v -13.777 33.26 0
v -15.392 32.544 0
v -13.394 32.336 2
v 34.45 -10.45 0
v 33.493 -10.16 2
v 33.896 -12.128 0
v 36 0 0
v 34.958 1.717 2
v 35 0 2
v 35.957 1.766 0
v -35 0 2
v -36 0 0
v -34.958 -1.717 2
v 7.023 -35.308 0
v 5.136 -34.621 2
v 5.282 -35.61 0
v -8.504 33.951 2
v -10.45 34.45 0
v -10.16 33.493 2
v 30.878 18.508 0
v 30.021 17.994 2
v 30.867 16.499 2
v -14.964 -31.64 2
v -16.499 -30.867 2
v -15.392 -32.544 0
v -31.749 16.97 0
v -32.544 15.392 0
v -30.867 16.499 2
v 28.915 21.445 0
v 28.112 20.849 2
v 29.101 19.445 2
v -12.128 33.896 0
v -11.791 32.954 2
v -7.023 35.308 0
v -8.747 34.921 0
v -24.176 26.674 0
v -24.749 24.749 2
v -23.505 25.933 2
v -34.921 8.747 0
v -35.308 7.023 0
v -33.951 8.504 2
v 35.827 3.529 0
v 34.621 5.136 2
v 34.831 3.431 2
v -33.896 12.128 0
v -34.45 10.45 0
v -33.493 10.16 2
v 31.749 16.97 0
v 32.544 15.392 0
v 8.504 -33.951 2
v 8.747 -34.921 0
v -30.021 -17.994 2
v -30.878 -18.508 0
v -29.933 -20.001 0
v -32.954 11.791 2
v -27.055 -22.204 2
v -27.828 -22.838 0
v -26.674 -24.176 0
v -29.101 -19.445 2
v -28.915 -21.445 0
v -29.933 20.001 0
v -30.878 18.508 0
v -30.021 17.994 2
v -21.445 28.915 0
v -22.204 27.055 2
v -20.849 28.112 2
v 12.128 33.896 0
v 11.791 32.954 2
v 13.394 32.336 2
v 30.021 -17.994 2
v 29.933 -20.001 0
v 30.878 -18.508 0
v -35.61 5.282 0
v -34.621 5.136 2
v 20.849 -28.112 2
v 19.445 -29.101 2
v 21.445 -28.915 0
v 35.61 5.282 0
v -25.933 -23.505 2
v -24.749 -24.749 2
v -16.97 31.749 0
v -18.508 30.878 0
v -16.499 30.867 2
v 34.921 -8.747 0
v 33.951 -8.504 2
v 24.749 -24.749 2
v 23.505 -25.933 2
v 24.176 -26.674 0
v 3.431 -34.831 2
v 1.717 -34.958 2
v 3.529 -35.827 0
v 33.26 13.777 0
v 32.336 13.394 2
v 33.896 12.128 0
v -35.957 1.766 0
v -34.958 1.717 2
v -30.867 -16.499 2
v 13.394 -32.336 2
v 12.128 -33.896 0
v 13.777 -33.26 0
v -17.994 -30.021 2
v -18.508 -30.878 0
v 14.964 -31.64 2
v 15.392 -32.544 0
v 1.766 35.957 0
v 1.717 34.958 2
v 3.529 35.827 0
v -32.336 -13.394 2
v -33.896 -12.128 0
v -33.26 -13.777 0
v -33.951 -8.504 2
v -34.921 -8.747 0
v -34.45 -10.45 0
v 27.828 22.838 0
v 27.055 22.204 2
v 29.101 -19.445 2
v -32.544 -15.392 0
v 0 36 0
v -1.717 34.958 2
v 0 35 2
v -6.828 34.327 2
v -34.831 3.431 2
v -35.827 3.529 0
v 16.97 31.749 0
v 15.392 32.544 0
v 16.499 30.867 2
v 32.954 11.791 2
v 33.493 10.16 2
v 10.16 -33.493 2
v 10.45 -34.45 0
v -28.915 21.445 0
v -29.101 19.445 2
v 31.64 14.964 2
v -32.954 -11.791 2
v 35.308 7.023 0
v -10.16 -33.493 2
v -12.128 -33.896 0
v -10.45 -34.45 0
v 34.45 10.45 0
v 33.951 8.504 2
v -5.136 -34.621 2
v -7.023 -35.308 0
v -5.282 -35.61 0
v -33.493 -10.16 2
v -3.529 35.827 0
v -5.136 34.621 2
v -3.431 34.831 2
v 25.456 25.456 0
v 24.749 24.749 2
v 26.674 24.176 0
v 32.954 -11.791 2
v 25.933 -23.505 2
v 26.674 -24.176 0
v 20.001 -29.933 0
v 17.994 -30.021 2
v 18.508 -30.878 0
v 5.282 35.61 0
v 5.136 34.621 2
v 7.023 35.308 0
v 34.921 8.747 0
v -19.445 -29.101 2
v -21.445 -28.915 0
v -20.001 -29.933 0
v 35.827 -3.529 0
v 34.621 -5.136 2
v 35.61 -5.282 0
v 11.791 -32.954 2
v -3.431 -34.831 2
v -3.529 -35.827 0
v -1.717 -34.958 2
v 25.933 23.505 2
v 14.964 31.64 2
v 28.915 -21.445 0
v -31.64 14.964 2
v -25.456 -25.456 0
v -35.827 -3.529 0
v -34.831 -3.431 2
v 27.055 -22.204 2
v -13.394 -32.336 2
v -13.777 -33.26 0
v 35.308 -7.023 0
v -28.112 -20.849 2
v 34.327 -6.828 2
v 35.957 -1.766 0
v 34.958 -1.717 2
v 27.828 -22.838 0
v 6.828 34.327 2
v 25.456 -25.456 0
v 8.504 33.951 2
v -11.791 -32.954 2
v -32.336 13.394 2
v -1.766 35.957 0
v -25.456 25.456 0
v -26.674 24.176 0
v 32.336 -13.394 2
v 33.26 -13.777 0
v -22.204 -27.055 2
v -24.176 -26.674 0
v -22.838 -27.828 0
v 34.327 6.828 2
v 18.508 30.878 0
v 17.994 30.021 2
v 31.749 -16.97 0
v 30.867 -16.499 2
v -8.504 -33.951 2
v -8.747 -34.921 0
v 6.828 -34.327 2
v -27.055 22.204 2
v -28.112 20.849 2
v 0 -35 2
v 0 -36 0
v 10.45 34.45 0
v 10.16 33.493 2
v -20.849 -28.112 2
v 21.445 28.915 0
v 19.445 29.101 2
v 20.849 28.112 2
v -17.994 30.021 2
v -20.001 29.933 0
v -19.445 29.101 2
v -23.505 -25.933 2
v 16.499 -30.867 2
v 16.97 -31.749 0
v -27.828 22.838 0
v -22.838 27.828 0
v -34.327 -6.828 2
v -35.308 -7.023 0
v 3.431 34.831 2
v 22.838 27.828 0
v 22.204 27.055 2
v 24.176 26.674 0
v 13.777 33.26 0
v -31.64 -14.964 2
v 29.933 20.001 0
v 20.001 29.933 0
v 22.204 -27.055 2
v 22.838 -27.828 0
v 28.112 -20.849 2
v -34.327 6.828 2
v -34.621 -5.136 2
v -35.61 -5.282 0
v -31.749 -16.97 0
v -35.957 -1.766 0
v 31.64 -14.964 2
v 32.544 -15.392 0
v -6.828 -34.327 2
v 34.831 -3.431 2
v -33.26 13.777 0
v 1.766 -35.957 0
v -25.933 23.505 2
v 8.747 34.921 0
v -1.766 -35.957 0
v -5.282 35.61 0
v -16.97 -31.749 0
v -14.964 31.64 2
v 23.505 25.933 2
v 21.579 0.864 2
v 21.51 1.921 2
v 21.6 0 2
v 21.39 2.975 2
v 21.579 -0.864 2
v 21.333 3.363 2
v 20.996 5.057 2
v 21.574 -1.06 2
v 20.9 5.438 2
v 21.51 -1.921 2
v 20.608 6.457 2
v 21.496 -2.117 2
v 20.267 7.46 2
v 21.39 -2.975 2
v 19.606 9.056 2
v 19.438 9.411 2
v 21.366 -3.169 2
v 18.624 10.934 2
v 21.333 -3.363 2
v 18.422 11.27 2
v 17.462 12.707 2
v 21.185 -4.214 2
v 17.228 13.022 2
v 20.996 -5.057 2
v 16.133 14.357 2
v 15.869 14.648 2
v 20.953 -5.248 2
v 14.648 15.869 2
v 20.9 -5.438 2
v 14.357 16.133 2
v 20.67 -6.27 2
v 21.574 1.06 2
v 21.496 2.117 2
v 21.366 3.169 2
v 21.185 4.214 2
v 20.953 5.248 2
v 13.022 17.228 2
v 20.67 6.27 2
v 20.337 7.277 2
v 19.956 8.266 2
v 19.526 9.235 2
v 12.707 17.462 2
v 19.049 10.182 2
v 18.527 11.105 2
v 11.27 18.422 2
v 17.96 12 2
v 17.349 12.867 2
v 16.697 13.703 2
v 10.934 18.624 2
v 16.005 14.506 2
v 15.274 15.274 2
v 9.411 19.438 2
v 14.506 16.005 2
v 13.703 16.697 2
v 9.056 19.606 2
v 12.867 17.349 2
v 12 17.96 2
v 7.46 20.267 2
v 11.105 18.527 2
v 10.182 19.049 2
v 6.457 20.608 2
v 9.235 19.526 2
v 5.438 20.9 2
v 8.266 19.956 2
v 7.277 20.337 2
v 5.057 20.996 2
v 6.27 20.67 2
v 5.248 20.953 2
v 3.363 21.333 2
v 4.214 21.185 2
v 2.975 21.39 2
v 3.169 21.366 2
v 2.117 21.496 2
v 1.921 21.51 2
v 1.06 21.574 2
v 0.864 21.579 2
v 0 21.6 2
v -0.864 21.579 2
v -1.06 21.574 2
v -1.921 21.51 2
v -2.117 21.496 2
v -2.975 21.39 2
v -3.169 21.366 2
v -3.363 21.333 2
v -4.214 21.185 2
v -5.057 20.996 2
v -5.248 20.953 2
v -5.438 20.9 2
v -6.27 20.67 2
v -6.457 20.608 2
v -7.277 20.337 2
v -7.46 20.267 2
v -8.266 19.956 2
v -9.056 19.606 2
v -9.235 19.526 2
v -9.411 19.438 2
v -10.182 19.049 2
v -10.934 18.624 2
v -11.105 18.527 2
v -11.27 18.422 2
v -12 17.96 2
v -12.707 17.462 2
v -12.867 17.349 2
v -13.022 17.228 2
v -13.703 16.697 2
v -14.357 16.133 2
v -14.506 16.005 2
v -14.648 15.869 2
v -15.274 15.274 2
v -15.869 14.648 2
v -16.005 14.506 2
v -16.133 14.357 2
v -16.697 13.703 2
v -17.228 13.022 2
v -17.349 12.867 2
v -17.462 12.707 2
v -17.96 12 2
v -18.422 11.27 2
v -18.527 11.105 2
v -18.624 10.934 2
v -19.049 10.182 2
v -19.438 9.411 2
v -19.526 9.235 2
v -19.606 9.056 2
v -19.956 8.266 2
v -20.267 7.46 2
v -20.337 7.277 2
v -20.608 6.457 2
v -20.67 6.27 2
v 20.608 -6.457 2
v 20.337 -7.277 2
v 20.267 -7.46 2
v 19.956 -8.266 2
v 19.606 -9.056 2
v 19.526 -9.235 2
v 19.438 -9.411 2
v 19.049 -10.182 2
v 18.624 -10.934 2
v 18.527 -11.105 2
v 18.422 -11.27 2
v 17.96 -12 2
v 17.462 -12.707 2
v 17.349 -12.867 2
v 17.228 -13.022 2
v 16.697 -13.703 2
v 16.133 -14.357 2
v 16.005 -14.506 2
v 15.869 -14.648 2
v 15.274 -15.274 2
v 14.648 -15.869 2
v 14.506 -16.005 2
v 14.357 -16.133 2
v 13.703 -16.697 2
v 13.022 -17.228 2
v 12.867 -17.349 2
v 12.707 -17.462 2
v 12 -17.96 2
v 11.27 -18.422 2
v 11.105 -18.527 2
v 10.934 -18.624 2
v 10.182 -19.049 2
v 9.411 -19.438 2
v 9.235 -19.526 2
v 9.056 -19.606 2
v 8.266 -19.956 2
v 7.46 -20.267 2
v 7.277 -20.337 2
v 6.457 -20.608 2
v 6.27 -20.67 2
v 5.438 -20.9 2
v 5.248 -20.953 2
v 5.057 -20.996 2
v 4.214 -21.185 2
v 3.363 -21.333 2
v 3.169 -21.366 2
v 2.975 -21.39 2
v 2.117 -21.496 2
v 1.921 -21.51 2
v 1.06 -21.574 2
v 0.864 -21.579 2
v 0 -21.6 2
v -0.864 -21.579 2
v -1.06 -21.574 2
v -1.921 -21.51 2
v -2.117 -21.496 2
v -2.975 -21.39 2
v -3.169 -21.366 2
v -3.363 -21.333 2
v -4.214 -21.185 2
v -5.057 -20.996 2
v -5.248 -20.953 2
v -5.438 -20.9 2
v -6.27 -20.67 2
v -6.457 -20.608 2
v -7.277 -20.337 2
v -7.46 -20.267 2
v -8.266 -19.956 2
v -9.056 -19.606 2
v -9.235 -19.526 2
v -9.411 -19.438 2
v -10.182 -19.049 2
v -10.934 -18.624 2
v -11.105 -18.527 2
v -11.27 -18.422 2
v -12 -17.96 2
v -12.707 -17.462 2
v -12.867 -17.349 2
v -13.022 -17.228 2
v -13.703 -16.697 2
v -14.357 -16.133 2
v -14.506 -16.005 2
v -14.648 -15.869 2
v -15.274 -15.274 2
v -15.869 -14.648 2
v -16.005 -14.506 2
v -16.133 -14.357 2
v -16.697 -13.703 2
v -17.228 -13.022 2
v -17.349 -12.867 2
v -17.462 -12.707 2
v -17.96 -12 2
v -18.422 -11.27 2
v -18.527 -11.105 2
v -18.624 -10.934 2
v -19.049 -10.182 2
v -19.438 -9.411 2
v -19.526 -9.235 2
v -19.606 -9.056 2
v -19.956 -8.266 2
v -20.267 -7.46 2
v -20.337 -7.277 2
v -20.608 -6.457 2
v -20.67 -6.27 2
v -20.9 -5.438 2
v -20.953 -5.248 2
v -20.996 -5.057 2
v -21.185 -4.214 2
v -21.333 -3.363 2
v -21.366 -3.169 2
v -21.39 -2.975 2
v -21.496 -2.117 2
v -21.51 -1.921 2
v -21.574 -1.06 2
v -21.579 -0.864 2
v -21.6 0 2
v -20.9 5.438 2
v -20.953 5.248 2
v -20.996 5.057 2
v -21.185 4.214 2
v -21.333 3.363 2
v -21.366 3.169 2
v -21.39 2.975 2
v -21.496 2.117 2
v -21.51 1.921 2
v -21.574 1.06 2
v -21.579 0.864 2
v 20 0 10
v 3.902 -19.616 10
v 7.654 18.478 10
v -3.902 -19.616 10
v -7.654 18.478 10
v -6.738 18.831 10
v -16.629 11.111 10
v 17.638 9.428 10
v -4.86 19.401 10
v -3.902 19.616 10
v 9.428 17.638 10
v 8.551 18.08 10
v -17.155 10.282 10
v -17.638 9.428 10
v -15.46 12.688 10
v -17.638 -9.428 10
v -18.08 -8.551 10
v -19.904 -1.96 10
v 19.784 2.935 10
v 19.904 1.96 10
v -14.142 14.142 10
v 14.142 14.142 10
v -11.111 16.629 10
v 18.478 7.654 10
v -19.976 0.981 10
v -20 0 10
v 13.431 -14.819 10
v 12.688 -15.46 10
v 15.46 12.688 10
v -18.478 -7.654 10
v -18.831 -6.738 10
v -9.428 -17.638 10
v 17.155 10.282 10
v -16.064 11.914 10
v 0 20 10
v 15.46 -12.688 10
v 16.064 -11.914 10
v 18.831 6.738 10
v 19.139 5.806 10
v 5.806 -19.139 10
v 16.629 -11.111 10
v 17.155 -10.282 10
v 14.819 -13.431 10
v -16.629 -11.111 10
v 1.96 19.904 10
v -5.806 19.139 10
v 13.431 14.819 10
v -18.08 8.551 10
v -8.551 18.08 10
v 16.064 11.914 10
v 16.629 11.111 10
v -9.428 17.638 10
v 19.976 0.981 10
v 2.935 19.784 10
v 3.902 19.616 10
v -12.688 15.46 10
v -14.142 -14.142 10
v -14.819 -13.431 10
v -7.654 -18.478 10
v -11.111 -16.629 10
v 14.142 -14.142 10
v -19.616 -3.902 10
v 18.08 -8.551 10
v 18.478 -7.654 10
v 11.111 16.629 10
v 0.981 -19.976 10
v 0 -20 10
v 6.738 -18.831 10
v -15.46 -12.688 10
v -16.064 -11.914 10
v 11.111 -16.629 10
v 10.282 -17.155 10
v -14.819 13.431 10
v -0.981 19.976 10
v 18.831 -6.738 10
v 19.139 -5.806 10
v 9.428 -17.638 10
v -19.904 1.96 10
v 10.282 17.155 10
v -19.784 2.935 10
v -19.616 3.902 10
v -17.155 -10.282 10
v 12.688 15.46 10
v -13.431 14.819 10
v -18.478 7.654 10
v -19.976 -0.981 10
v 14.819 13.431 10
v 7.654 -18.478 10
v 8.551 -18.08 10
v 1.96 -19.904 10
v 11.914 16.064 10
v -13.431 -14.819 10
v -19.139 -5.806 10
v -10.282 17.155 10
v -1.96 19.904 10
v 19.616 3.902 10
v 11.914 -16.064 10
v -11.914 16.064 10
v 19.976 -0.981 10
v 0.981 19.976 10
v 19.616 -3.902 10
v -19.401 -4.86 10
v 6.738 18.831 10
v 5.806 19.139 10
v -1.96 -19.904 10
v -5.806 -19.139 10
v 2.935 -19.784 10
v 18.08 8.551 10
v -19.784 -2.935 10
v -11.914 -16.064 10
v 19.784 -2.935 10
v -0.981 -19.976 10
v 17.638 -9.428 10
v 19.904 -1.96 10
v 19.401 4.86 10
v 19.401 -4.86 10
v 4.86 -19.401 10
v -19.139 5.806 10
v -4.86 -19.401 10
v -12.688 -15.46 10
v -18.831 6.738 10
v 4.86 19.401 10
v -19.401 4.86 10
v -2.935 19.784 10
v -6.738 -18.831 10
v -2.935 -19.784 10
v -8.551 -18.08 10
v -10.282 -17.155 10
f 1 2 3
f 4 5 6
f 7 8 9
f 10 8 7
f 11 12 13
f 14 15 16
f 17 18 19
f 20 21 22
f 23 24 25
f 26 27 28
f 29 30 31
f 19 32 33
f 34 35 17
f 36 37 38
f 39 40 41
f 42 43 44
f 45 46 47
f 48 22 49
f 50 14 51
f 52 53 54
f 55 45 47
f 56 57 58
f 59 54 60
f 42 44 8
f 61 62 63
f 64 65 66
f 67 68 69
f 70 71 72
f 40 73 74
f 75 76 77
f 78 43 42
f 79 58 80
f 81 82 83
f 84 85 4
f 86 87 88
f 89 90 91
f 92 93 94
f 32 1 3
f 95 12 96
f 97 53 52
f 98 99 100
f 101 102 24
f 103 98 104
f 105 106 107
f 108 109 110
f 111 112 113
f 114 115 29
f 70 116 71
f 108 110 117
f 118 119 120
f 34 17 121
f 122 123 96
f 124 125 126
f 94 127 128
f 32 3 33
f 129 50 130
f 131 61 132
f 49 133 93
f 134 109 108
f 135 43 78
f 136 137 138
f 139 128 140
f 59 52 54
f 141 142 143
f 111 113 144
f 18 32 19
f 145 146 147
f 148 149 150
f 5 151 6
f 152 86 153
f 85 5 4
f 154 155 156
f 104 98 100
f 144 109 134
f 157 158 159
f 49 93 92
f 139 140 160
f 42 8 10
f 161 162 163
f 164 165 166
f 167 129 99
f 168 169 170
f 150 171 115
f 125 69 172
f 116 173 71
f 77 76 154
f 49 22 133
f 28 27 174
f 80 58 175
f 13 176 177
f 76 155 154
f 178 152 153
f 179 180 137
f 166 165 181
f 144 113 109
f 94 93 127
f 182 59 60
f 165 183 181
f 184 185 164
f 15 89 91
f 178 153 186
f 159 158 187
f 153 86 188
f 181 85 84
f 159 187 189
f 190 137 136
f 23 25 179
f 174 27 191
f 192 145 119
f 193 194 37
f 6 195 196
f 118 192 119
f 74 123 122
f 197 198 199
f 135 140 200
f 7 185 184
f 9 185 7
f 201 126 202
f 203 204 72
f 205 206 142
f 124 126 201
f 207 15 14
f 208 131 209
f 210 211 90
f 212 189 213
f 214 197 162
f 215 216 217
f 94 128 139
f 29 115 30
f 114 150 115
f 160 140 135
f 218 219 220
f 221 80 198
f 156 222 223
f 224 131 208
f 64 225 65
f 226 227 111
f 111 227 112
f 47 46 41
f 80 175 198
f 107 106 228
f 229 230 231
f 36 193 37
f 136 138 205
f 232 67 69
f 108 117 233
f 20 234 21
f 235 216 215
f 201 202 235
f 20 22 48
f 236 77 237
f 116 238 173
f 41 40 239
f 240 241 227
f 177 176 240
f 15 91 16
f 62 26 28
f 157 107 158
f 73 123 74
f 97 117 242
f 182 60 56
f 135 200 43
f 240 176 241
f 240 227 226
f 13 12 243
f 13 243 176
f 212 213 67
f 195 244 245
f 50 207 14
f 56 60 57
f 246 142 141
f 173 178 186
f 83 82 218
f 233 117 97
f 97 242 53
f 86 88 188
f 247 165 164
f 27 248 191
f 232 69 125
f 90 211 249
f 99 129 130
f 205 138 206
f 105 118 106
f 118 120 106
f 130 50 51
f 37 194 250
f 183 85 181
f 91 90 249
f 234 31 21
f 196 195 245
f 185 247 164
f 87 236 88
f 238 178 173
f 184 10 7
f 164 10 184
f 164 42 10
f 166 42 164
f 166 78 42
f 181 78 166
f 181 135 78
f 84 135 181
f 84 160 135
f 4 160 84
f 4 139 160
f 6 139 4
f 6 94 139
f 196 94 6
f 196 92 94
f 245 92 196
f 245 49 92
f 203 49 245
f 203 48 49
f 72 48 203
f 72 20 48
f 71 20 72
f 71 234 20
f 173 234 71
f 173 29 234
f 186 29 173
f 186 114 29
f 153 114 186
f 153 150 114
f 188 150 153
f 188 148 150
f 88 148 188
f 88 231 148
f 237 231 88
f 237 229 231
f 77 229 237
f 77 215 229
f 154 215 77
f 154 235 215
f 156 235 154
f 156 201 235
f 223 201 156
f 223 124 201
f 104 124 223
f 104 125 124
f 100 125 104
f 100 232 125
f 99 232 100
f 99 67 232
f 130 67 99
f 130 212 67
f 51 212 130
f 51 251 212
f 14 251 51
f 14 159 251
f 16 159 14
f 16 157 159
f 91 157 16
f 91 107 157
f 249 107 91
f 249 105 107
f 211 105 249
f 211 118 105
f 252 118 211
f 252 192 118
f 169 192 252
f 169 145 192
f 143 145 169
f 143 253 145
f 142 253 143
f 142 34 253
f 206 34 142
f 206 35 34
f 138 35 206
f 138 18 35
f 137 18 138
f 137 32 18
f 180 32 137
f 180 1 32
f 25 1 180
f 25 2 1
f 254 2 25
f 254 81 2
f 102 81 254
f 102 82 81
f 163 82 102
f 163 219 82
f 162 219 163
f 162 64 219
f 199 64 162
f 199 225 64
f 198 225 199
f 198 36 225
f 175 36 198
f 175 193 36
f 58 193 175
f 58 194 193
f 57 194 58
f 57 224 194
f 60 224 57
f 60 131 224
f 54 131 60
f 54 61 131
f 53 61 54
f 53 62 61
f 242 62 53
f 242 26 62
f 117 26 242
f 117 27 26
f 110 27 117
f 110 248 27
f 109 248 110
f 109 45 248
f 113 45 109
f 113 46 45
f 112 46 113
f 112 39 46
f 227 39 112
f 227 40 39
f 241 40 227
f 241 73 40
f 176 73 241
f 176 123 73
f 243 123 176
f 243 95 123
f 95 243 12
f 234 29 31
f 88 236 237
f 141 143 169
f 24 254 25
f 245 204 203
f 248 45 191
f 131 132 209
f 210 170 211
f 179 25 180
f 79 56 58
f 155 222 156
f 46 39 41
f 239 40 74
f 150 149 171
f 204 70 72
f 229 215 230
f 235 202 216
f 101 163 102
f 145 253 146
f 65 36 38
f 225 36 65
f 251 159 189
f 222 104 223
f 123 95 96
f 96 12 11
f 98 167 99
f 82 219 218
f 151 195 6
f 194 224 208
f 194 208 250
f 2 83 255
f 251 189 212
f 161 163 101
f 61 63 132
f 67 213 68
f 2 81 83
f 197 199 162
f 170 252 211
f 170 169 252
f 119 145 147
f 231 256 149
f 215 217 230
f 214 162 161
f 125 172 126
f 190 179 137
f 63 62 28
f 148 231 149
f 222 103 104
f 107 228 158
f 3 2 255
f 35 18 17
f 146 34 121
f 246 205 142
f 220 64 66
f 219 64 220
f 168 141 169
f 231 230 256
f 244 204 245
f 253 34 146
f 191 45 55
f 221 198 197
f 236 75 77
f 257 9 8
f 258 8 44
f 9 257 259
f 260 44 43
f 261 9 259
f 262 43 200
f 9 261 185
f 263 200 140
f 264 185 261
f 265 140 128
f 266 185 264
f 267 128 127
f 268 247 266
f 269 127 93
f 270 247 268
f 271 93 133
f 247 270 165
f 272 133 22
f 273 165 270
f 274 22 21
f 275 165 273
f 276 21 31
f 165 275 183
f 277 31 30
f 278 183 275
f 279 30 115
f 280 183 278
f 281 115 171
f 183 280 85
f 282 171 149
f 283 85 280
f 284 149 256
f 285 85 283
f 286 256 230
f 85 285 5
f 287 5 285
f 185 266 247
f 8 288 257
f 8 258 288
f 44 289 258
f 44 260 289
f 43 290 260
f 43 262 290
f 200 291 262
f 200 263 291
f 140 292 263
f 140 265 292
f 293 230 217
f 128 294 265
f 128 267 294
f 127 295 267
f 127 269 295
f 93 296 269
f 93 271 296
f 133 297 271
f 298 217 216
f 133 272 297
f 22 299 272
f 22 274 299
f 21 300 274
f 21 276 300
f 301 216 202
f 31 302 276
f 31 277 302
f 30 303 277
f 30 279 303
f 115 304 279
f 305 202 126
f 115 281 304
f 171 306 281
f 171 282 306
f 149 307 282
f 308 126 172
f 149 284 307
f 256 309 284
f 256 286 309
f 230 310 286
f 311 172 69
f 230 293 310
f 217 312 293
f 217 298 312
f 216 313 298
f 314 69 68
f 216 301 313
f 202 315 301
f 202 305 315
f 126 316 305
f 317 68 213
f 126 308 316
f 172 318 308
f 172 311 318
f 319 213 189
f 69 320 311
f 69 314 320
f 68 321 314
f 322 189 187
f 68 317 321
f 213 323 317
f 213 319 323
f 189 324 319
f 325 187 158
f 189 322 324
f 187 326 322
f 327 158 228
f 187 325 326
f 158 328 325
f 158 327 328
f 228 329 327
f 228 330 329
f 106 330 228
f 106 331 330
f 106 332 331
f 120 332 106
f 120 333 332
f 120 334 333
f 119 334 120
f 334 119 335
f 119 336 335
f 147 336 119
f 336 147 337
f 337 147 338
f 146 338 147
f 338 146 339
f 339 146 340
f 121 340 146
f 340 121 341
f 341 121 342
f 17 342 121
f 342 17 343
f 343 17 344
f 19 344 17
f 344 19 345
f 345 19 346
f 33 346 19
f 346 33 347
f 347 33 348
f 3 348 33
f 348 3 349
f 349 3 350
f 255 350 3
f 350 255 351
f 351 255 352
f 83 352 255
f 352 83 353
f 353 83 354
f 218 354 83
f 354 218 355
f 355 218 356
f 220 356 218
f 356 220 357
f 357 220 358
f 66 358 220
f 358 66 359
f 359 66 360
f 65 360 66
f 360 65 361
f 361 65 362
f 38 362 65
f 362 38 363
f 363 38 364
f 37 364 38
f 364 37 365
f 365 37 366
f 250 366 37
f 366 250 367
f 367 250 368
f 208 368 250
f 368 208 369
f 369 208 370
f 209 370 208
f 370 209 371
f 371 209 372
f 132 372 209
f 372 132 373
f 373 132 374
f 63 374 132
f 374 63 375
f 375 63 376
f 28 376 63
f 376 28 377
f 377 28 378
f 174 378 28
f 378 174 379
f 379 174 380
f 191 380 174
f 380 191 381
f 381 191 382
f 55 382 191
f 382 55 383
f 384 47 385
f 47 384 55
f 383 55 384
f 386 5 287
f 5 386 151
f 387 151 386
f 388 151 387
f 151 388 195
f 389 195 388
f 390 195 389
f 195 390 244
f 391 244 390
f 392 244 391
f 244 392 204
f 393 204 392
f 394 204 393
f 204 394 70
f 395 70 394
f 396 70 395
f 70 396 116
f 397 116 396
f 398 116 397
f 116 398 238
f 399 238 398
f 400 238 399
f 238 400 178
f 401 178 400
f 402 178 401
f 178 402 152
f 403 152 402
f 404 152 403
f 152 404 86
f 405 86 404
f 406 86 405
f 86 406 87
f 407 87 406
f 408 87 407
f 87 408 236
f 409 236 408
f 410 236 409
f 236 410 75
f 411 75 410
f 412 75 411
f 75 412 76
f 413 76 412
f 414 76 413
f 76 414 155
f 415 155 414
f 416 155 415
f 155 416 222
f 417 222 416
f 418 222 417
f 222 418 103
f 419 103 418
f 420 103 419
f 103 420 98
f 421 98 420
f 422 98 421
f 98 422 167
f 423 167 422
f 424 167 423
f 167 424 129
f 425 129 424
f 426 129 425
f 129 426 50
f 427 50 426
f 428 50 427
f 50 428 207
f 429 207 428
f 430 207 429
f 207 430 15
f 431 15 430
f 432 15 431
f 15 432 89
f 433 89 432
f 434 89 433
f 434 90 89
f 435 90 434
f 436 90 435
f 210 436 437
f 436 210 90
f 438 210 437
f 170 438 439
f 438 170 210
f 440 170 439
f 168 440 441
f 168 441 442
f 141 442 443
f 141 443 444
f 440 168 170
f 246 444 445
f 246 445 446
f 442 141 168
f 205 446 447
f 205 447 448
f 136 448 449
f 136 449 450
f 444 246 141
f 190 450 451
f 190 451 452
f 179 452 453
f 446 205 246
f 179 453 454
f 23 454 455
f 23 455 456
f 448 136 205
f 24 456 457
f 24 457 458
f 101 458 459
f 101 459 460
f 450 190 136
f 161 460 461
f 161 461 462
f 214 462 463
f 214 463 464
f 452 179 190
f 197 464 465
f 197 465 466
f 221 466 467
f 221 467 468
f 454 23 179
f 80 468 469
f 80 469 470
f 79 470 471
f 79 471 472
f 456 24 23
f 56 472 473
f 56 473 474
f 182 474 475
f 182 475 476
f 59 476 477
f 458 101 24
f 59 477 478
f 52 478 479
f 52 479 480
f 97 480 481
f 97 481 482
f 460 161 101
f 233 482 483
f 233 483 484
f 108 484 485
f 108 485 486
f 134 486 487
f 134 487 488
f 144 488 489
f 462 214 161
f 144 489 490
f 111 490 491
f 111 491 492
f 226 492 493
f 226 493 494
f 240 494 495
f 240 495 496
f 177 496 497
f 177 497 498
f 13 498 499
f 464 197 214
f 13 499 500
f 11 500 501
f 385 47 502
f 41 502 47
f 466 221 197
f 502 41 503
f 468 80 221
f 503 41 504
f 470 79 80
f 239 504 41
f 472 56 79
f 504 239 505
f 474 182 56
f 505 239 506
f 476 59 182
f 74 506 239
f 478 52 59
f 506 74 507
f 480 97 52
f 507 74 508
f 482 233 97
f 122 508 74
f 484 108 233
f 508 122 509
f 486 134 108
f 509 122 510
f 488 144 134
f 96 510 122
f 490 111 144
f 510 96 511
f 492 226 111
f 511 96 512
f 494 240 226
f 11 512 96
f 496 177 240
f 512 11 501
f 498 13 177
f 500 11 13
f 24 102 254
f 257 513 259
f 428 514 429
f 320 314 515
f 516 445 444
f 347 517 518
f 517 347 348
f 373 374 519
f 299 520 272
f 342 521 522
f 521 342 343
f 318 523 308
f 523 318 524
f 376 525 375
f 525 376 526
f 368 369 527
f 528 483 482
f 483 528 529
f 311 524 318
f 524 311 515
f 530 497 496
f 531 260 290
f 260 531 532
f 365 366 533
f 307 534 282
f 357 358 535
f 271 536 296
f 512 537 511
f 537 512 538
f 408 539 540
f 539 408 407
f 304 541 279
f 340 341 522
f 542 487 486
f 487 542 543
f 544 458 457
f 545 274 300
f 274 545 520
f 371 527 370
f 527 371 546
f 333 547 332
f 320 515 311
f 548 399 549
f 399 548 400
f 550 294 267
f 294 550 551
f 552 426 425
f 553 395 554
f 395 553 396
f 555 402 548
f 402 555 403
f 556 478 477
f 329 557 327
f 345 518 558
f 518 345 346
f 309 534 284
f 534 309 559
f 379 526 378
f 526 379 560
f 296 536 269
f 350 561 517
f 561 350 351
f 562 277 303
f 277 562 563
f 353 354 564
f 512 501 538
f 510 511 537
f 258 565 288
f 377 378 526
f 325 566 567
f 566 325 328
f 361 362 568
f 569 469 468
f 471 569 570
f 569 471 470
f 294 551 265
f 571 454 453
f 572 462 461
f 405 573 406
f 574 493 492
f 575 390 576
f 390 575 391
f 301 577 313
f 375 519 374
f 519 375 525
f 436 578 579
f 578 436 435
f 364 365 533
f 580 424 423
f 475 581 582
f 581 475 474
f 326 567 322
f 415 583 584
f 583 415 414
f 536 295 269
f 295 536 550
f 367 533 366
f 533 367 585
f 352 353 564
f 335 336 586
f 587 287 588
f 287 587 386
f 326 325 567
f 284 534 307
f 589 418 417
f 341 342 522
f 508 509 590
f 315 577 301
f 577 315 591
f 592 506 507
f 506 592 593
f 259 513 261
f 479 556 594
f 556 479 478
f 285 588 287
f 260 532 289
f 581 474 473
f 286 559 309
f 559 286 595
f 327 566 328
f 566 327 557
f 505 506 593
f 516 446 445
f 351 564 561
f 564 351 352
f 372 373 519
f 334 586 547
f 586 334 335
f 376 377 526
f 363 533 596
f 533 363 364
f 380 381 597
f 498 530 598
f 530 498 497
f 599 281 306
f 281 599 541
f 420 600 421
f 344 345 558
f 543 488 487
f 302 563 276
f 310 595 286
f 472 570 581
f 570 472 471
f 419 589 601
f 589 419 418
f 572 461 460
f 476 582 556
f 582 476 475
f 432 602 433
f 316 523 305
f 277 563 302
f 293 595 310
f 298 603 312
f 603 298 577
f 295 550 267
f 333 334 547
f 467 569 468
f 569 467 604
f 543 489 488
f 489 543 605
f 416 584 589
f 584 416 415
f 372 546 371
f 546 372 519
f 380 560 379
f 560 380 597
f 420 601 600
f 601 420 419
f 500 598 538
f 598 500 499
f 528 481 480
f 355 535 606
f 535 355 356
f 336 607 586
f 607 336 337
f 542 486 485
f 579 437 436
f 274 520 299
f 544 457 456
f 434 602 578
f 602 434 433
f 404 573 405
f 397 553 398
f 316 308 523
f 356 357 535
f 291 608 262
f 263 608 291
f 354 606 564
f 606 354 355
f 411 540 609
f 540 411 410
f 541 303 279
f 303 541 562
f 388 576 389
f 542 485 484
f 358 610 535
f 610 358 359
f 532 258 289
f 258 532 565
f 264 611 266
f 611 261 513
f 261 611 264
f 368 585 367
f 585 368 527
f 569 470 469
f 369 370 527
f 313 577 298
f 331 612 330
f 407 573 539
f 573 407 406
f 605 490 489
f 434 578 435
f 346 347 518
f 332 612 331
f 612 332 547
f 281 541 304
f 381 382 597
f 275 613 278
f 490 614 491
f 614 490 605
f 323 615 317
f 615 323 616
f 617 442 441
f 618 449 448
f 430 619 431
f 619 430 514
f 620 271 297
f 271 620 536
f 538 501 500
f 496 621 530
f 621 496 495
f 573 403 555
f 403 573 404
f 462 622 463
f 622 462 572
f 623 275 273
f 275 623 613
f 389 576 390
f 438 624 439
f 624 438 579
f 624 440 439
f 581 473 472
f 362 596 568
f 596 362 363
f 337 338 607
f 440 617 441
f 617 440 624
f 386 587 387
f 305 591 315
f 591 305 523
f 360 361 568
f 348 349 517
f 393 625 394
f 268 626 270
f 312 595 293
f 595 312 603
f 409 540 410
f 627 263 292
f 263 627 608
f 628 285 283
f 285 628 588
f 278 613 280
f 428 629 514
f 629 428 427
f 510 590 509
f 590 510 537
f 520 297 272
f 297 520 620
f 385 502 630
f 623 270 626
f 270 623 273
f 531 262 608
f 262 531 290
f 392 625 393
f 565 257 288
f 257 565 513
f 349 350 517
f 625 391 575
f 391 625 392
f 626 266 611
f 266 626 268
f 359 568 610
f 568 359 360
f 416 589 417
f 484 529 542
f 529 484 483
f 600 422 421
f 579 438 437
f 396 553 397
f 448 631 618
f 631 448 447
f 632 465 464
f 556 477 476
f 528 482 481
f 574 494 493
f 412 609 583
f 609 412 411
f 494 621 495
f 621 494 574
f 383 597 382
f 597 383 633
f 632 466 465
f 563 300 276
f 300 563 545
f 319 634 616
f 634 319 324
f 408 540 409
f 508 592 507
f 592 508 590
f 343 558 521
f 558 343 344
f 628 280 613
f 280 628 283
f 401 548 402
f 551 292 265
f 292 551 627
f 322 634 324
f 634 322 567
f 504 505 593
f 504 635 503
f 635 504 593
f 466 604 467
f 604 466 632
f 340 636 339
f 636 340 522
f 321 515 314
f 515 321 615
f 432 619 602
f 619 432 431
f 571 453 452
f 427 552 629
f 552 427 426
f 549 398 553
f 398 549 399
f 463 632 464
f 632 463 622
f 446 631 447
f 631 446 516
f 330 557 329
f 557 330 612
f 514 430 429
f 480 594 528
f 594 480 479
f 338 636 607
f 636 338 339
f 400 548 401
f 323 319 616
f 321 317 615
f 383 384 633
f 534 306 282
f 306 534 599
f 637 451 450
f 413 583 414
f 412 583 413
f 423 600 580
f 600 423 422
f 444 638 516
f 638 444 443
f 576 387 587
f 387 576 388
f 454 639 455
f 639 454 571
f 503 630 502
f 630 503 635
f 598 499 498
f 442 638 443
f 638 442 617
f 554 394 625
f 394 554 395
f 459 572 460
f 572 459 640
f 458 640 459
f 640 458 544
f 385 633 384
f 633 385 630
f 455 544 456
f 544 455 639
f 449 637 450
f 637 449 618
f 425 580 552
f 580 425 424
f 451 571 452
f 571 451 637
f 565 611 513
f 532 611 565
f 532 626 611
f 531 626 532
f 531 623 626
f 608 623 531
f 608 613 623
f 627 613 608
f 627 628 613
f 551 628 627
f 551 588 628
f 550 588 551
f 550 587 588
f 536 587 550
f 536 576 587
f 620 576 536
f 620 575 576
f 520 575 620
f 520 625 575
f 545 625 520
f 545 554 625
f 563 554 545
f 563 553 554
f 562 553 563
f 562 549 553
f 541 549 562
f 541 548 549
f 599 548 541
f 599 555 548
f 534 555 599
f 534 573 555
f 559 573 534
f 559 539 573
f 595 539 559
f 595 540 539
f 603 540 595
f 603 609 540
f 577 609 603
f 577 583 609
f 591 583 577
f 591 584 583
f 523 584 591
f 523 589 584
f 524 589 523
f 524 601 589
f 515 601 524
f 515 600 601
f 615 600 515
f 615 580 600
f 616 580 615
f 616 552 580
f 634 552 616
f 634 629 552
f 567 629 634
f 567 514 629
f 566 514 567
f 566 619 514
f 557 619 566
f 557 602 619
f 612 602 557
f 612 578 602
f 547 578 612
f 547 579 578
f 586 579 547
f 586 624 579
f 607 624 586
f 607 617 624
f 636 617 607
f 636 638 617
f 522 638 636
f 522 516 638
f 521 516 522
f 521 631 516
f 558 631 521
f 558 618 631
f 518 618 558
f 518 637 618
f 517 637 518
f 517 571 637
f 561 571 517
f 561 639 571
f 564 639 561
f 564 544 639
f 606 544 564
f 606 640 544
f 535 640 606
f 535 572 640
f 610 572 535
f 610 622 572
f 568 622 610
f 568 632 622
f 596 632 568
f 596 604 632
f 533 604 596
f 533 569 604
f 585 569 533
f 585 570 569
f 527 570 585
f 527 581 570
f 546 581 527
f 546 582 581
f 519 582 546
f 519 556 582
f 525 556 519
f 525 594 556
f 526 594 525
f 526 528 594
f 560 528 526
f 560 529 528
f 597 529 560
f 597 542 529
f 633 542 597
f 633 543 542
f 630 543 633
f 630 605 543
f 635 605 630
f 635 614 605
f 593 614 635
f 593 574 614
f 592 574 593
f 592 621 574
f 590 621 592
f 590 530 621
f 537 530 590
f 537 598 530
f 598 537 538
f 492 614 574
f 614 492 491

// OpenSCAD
cylinder(d1=72,d2=70,h=2,$fn=128);
cylinder(d1=44,d2=40,h=10,$fn=128);
